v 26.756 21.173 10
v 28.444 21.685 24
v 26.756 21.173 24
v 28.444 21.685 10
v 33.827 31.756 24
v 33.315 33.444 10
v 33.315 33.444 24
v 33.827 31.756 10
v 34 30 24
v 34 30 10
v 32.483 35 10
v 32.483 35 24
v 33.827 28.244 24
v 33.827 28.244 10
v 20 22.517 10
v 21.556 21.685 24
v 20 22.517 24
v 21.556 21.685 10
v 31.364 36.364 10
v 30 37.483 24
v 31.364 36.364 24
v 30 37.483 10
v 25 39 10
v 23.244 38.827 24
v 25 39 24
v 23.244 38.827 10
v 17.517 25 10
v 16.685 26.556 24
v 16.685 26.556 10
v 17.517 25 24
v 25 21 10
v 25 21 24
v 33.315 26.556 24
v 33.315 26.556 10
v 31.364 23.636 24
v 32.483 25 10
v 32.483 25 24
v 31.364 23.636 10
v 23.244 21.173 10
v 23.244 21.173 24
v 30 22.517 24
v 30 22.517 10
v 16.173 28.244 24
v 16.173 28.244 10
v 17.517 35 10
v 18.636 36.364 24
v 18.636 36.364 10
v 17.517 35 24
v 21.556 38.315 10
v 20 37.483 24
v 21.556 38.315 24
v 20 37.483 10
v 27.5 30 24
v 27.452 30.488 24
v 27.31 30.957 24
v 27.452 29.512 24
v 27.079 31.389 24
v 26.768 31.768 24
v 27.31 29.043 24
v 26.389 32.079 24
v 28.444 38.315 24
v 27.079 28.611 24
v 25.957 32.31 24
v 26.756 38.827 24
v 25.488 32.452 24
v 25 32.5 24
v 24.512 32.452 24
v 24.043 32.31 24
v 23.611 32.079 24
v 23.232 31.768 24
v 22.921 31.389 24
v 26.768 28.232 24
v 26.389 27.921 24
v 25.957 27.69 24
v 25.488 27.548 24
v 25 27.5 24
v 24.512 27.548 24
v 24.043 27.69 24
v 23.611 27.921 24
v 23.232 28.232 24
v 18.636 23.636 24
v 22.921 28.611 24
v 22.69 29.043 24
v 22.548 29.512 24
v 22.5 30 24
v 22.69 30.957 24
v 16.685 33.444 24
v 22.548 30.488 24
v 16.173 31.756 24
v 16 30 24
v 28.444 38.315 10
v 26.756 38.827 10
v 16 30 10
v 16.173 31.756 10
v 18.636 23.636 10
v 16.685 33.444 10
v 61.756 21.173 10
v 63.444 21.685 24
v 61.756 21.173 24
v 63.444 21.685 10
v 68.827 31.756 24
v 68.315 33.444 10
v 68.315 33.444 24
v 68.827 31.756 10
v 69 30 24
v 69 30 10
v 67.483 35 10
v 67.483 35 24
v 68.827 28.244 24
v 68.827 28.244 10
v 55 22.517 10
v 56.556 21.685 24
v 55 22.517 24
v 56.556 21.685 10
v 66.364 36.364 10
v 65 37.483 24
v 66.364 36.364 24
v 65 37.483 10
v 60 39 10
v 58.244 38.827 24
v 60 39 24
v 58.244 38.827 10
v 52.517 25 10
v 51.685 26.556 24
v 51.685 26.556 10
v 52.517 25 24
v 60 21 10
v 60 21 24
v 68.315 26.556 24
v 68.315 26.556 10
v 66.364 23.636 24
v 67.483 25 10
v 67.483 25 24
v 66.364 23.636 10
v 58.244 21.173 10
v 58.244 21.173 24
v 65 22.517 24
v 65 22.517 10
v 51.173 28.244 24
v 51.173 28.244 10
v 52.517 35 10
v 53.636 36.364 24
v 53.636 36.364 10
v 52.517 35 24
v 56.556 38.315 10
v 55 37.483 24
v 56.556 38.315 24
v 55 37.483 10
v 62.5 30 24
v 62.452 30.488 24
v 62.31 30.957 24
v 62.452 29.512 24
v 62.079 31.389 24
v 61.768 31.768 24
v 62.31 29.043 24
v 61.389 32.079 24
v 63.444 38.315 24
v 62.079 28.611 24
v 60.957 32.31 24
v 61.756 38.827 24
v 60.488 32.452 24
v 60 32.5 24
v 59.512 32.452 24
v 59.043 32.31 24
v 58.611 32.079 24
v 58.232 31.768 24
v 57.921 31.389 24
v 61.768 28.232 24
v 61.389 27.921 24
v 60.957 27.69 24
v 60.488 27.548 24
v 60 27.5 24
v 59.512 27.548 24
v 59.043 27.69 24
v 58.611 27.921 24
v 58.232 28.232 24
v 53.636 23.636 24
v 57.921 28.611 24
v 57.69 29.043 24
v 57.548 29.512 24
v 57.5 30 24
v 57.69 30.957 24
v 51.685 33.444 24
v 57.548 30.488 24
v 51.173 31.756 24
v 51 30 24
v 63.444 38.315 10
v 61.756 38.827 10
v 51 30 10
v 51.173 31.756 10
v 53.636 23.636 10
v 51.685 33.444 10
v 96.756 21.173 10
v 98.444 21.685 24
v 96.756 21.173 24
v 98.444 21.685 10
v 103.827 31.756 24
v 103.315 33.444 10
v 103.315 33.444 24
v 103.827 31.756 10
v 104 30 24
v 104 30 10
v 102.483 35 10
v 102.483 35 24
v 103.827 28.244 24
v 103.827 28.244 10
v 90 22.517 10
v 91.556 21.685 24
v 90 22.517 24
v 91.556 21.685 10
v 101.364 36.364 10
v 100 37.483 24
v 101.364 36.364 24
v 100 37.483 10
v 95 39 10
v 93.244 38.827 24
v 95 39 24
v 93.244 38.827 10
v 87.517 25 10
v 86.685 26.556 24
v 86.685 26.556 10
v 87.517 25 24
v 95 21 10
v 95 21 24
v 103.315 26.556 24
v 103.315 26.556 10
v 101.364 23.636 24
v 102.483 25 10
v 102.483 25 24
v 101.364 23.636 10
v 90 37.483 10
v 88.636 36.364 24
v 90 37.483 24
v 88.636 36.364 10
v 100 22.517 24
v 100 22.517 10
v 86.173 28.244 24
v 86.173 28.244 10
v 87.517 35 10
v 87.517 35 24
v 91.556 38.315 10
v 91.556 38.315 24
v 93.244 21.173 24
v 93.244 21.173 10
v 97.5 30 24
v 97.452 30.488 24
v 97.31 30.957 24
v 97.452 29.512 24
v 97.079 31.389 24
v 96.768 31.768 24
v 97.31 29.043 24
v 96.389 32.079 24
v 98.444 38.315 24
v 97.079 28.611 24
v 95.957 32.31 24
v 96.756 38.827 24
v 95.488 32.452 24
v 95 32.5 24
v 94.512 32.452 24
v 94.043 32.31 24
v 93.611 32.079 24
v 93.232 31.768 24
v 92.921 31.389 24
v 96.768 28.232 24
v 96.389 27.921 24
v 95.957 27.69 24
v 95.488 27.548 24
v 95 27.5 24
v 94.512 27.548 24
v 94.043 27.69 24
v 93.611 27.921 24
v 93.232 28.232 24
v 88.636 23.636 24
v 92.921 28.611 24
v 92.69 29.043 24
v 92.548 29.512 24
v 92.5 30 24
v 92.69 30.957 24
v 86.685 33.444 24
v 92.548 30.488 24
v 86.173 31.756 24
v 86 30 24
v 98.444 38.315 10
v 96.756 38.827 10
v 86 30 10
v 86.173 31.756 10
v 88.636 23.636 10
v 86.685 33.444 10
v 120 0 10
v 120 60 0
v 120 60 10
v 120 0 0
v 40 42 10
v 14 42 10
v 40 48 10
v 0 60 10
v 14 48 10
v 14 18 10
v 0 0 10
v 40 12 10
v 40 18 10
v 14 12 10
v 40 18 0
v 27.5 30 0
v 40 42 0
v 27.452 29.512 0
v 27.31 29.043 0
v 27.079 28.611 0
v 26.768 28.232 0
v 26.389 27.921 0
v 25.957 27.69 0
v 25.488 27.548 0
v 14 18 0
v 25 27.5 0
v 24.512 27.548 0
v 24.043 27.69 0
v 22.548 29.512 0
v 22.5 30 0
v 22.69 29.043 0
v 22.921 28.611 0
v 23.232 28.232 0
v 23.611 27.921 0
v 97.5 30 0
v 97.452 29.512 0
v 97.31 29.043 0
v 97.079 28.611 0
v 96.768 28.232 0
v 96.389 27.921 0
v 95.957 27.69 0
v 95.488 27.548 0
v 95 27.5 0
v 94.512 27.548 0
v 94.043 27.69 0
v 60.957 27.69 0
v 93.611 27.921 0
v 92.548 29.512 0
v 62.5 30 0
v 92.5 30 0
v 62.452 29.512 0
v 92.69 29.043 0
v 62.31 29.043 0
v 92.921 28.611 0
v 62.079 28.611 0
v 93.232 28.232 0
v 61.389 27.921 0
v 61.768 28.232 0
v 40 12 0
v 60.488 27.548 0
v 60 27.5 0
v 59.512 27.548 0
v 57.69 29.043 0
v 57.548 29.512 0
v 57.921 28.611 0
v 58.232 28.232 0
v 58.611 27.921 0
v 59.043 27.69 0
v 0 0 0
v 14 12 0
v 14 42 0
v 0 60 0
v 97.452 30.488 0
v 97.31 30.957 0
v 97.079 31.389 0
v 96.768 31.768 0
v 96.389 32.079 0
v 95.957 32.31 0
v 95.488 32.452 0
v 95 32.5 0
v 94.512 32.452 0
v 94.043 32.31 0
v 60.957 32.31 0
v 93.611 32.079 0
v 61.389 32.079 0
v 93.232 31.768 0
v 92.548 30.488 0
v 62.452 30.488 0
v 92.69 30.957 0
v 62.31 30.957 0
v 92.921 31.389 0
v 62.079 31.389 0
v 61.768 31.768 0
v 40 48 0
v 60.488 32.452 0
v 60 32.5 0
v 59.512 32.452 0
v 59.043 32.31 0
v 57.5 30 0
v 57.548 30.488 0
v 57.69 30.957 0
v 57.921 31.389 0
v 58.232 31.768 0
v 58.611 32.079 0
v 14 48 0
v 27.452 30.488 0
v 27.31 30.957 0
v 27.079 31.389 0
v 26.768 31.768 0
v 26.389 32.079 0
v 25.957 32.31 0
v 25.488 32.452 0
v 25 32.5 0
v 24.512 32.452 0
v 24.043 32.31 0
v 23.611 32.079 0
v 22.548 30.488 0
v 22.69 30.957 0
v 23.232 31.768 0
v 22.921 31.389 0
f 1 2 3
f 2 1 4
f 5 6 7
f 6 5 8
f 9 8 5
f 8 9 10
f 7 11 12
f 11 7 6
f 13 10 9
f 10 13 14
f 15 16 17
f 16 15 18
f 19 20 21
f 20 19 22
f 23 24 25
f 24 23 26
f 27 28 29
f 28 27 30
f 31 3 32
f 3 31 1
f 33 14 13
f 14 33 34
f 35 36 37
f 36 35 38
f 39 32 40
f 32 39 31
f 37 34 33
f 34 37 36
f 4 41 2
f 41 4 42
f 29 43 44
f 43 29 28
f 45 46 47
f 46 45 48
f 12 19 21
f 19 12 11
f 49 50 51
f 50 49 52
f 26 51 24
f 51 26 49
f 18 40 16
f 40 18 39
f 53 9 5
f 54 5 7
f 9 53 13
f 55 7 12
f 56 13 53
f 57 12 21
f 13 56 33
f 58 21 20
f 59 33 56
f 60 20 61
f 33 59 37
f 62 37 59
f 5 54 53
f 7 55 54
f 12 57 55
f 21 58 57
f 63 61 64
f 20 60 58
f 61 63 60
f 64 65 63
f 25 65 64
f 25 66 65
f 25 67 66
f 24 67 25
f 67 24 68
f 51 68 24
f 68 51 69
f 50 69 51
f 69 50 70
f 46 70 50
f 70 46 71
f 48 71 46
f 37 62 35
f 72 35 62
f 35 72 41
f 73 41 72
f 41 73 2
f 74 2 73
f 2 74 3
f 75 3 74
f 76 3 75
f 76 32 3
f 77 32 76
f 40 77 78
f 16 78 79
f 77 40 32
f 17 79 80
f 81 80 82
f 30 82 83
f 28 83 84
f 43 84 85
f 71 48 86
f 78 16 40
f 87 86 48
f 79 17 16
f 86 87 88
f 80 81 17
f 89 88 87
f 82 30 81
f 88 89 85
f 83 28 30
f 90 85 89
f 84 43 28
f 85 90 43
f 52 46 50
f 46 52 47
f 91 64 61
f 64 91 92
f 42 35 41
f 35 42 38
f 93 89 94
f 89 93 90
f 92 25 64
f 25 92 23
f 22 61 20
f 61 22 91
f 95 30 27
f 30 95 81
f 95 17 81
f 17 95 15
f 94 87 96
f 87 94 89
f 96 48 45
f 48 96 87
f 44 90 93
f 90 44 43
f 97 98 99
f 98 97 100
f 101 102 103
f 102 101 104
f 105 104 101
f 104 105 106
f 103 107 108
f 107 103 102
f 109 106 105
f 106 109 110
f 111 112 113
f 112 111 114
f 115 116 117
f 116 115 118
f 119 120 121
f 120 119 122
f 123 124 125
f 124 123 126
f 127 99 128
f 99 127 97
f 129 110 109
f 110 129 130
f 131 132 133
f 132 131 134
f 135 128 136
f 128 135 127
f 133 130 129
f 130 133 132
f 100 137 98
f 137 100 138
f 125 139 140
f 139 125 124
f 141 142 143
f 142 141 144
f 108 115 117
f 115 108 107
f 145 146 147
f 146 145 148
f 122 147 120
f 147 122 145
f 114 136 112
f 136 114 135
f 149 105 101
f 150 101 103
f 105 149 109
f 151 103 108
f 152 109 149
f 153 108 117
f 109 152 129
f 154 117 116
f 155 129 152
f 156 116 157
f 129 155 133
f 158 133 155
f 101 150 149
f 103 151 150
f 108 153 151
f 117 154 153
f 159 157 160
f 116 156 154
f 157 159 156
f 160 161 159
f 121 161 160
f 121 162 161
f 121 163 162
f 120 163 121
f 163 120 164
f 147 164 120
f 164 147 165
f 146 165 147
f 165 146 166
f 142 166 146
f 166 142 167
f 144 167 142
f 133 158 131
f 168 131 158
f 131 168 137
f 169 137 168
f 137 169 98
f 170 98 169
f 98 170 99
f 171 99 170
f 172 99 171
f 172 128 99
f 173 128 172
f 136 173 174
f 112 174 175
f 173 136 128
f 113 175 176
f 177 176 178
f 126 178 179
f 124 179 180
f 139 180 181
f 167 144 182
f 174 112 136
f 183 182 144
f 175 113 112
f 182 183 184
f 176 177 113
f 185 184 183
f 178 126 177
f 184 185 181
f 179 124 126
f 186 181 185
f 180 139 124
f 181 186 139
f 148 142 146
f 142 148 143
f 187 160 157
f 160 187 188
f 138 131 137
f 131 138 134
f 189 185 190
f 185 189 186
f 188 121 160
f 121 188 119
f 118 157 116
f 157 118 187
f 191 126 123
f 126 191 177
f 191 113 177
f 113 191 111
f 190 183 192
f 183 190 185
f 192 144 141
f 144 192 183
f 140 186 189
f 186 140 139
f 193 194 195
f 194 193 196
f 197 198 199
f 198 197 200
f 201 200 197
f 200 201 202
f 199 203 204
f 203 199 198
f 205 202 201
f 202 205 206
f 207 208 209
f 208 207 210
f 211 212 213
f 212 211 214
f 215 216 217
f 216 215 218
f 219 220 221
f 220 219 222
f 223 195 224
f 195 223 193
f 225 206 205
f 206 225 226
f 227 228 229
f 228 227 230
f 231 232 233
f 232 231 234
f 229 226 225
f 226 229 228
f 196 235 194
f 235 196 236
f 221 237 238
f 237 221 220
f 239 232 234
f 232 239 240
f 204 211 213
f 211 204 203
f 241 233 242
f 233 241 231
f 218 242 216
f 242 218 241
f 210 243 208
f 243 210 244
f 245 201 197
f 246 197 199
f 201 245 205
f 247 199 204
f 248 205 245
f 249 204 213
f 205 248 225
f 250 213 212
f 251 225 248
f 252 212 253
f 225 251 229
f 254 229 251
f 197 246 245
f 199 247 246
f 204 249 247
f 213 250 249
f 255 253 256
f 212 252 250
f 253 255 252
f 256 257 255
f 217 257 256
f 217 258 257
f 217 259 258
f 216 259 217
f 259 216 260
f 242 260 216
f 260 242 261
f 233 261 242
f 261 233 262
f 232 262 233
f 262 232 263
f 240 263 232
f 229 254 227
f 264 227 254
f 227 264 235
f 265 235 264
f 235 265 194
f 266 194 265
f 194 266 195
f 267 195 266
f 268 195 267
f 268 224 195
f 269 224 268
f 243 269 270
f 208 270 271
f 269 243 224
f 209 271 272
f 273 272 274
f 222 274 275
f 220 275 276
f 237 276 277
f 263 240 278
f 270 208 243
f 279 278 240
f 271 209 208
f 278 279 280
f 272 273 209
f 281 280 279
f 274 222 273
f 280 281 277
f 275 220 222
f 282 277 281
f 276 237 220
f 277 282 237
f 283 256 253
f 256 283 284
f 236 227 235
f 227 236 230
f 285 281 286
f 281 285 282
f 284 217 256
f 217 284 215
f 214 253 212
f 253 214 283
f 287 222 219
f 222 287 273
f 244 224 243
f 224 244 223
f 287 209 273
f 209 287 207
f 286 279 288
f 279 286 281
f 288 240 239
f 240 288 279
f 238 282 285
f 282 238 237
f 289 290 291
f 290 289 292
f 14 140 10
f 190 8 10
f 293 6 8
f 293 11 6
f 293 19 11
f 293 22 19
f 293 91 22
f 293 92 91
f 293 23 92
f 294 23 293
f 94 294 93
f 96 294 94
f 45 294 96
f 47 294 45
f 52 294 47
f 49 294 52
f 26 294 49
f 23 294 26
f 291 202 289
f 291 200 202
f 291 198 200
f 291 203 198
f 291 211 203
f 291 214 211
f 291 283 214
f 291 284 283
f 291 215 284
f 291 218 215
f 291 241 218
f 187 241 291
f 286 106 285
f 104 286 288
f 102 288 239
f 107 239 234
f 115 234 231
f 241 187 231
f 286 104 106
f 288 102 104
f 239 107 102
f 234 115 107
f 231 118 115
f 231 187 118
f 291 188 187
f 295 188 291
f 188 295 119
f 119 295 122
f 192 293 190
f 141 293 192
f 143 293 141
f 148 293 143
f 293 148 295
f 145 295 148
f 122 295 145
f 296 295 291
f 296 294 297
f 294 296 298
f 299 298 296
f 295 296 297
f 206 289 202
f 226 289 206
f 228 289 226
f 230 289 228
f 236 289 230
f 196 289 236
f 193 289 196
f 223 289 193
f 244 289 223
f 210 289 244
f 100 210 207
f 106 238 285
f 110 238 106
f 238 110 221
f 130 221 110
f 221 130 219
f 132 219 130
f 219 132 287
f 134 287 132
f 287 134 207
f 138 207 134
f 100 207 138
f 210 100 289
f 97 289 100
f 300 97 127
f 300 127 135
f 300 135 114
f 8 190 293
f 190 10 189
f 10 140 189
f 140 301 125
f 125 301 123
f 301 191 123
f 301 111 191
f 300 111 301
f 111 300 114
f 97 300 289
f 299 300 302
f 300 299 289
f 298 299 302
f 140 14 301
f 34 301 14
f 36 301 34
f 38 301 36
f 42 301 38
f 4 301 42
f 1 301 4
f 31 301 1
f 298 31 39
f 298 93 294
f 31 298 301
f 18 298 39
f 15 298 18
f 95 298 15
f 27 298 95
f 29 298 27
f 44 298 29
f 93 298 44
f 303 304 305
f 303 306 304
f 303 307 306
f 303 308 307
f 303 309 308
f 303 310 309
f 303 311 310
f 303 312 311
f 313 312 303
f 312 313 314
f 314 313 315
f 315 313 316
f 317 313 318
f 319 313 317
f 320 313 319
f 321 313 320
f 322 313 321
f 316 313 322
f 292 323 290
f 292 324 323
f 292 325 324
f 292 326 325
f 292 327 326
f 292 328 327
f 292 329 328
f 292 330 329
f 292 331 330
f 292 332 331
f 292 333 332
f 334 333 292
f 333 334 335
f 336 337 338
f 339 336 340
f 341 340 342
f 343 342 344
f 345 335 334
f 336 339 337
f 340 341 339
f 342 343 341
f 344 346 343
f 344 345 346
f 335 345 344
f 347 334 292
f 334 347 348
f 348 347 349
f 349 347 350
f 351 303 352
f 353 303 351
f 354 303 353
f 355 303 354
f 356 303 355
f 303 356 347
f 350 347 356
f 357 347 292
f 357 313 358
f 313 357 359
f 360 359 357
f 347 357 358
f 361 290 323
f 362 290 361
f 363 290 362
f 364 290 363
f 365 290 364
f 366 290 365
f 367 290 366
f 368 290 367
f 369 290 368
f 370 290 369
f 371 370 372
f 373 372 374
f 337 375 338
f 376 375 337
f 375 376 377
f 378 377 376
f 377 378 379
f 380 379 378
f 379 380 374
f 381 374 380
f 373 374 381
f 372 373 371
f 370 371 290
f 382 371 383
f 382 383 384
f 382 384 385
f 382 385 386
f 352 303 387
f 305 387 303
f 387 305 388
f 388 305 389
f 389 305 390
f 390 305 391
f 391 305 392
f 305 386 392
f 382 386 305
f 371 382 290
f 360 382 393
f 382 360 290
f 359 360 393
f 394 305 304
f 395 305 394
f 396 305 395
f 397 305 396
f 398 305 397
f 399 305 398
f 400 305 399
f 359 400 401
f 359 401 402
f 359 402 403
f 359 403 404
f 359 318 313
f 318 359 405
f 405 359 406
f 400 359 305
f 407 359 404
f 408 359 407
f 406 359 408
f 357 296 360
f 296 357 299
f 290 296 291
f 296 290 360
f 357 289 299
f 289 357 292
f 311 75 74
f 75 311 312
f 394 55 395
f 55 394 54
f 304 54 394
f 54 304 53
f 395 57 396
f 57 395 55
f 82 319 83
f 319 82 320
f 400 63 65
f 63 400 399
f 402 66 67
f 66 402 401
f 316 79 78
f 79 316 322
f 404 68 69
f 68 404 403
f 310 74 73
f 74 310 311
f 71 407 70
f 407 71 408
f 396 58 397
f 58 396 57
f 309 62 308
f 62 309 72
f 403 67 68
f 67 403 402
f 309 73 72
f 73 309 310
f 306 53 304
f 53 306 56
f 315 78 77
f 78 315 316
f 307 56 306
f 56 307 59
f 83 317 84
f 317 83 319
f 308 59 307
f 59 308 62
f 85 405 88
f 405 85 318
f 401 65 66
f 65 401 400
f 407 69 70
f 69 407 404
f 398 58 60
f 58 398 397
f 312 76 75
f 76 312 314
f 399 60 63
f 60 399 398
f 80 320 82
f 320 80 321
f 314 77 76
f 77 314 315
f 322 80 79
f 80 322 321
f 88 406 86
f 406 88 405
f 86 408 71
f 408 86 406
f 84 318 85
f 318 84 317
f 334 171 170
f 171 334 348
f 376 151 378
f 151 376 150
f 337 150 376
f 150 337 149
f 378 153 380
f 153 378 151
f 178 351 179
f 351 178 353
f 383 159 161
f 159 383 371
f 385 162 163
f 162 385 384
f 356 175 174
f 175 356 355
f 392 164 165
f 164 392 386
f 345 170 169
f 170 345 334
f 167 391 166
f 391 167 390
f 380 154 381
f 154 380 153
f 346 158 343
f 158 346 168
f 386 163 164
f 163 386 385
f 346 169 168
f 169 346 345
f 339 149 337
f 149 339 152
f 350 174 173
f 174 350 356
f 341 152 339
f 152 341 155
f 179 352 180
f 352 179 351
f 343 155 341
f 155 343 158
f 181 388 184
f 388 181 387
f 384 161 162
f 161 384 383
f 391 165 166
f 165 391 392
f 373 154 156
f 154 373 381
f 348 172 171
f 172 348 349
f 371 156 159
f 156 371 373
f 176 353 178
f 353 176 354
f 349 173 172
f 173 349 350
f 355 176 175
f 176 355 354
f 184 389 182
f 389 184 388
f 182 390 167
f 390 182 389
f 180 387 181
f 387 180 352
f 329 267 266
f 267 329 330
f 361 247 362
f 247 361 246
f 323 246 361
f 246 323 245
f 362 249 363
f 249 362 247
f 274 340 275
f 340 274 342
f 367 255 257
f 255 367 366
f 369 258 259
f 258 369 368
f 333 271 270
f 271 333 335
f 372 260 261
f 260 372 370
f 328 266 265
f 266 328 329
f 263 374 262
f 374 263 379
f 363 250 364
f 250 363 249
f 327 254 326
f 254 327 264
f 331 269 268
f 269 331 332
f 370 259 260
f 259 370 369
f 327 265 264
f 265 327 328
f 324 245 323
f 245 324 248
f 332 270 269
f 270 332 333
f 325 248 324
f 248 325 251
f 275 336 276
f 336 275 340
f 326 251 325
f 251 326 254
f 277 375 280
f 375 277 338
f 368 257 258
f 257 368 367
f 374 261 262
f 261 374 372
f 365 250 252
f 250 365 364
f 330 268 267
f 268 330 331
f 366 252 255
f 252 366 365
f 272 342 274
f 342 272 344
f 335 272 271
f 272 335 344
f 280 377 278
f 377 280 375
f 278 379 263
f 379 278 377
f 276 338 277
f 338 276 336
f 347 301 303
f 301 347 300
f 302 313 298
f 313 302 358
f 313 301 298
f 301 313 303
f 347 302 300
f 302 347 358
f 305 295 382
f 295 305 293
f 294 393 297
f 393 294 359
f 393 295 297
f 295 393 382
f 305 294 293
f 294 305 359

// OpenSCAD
$fn = 32;

// ----------------------------------------------------------------------
// Drill jig: three_boss_slot jig
// ----------------------------------------------------------------------

// --- parameters (mm) ---
plate_l = 120;            // plate length, X
plate_w = 60;             // plate width, Y
plate_t = 10;             // plate thickness
boss_d = 18;              // guide boss diameter
boss_h = 15;              // boss height above the plate
guide_d = 5;              // guide hole diameter
boss_pitch = 35;          // boss pitch
slot_w = 6;               // clamp slot width
slot_l = 26;              // clamp slot length
slot_x = 14;              // slot start X

n_boss = 3;  // guide bosses
boss_x0 = (plate_l - (n_boss - 1) * boss_pitch) / 2;  // first boss X
boss_top = plate_t - 1 + boss_h;  // boss crown height
total_h = boss_top;  // overall height

difference() {
  union() {
  cube([plate_l, plate_w, plate_t]);
  for (i = [0 : n_boss - 1])
    translate([boss_x0 + i * boss_pitch, plate_w / 2, plate_t - 1])
      cylinder(h = boss_h, d = boss_d);
  }
  for (i = [0 : n_boss - 1])
    translate([boss_x0 + i * boss_pitch, plate_w / 2, -1])
      cylinder(h = plate_t + boss_h, d = guide_d);
  for (cy = [plate_w * 0.25, plate_w * 0.75])
    translate([slot_x, cy - slot_w / 2, -1])
      cube([slot_l, slot_w, plate_t + 2]);
}
